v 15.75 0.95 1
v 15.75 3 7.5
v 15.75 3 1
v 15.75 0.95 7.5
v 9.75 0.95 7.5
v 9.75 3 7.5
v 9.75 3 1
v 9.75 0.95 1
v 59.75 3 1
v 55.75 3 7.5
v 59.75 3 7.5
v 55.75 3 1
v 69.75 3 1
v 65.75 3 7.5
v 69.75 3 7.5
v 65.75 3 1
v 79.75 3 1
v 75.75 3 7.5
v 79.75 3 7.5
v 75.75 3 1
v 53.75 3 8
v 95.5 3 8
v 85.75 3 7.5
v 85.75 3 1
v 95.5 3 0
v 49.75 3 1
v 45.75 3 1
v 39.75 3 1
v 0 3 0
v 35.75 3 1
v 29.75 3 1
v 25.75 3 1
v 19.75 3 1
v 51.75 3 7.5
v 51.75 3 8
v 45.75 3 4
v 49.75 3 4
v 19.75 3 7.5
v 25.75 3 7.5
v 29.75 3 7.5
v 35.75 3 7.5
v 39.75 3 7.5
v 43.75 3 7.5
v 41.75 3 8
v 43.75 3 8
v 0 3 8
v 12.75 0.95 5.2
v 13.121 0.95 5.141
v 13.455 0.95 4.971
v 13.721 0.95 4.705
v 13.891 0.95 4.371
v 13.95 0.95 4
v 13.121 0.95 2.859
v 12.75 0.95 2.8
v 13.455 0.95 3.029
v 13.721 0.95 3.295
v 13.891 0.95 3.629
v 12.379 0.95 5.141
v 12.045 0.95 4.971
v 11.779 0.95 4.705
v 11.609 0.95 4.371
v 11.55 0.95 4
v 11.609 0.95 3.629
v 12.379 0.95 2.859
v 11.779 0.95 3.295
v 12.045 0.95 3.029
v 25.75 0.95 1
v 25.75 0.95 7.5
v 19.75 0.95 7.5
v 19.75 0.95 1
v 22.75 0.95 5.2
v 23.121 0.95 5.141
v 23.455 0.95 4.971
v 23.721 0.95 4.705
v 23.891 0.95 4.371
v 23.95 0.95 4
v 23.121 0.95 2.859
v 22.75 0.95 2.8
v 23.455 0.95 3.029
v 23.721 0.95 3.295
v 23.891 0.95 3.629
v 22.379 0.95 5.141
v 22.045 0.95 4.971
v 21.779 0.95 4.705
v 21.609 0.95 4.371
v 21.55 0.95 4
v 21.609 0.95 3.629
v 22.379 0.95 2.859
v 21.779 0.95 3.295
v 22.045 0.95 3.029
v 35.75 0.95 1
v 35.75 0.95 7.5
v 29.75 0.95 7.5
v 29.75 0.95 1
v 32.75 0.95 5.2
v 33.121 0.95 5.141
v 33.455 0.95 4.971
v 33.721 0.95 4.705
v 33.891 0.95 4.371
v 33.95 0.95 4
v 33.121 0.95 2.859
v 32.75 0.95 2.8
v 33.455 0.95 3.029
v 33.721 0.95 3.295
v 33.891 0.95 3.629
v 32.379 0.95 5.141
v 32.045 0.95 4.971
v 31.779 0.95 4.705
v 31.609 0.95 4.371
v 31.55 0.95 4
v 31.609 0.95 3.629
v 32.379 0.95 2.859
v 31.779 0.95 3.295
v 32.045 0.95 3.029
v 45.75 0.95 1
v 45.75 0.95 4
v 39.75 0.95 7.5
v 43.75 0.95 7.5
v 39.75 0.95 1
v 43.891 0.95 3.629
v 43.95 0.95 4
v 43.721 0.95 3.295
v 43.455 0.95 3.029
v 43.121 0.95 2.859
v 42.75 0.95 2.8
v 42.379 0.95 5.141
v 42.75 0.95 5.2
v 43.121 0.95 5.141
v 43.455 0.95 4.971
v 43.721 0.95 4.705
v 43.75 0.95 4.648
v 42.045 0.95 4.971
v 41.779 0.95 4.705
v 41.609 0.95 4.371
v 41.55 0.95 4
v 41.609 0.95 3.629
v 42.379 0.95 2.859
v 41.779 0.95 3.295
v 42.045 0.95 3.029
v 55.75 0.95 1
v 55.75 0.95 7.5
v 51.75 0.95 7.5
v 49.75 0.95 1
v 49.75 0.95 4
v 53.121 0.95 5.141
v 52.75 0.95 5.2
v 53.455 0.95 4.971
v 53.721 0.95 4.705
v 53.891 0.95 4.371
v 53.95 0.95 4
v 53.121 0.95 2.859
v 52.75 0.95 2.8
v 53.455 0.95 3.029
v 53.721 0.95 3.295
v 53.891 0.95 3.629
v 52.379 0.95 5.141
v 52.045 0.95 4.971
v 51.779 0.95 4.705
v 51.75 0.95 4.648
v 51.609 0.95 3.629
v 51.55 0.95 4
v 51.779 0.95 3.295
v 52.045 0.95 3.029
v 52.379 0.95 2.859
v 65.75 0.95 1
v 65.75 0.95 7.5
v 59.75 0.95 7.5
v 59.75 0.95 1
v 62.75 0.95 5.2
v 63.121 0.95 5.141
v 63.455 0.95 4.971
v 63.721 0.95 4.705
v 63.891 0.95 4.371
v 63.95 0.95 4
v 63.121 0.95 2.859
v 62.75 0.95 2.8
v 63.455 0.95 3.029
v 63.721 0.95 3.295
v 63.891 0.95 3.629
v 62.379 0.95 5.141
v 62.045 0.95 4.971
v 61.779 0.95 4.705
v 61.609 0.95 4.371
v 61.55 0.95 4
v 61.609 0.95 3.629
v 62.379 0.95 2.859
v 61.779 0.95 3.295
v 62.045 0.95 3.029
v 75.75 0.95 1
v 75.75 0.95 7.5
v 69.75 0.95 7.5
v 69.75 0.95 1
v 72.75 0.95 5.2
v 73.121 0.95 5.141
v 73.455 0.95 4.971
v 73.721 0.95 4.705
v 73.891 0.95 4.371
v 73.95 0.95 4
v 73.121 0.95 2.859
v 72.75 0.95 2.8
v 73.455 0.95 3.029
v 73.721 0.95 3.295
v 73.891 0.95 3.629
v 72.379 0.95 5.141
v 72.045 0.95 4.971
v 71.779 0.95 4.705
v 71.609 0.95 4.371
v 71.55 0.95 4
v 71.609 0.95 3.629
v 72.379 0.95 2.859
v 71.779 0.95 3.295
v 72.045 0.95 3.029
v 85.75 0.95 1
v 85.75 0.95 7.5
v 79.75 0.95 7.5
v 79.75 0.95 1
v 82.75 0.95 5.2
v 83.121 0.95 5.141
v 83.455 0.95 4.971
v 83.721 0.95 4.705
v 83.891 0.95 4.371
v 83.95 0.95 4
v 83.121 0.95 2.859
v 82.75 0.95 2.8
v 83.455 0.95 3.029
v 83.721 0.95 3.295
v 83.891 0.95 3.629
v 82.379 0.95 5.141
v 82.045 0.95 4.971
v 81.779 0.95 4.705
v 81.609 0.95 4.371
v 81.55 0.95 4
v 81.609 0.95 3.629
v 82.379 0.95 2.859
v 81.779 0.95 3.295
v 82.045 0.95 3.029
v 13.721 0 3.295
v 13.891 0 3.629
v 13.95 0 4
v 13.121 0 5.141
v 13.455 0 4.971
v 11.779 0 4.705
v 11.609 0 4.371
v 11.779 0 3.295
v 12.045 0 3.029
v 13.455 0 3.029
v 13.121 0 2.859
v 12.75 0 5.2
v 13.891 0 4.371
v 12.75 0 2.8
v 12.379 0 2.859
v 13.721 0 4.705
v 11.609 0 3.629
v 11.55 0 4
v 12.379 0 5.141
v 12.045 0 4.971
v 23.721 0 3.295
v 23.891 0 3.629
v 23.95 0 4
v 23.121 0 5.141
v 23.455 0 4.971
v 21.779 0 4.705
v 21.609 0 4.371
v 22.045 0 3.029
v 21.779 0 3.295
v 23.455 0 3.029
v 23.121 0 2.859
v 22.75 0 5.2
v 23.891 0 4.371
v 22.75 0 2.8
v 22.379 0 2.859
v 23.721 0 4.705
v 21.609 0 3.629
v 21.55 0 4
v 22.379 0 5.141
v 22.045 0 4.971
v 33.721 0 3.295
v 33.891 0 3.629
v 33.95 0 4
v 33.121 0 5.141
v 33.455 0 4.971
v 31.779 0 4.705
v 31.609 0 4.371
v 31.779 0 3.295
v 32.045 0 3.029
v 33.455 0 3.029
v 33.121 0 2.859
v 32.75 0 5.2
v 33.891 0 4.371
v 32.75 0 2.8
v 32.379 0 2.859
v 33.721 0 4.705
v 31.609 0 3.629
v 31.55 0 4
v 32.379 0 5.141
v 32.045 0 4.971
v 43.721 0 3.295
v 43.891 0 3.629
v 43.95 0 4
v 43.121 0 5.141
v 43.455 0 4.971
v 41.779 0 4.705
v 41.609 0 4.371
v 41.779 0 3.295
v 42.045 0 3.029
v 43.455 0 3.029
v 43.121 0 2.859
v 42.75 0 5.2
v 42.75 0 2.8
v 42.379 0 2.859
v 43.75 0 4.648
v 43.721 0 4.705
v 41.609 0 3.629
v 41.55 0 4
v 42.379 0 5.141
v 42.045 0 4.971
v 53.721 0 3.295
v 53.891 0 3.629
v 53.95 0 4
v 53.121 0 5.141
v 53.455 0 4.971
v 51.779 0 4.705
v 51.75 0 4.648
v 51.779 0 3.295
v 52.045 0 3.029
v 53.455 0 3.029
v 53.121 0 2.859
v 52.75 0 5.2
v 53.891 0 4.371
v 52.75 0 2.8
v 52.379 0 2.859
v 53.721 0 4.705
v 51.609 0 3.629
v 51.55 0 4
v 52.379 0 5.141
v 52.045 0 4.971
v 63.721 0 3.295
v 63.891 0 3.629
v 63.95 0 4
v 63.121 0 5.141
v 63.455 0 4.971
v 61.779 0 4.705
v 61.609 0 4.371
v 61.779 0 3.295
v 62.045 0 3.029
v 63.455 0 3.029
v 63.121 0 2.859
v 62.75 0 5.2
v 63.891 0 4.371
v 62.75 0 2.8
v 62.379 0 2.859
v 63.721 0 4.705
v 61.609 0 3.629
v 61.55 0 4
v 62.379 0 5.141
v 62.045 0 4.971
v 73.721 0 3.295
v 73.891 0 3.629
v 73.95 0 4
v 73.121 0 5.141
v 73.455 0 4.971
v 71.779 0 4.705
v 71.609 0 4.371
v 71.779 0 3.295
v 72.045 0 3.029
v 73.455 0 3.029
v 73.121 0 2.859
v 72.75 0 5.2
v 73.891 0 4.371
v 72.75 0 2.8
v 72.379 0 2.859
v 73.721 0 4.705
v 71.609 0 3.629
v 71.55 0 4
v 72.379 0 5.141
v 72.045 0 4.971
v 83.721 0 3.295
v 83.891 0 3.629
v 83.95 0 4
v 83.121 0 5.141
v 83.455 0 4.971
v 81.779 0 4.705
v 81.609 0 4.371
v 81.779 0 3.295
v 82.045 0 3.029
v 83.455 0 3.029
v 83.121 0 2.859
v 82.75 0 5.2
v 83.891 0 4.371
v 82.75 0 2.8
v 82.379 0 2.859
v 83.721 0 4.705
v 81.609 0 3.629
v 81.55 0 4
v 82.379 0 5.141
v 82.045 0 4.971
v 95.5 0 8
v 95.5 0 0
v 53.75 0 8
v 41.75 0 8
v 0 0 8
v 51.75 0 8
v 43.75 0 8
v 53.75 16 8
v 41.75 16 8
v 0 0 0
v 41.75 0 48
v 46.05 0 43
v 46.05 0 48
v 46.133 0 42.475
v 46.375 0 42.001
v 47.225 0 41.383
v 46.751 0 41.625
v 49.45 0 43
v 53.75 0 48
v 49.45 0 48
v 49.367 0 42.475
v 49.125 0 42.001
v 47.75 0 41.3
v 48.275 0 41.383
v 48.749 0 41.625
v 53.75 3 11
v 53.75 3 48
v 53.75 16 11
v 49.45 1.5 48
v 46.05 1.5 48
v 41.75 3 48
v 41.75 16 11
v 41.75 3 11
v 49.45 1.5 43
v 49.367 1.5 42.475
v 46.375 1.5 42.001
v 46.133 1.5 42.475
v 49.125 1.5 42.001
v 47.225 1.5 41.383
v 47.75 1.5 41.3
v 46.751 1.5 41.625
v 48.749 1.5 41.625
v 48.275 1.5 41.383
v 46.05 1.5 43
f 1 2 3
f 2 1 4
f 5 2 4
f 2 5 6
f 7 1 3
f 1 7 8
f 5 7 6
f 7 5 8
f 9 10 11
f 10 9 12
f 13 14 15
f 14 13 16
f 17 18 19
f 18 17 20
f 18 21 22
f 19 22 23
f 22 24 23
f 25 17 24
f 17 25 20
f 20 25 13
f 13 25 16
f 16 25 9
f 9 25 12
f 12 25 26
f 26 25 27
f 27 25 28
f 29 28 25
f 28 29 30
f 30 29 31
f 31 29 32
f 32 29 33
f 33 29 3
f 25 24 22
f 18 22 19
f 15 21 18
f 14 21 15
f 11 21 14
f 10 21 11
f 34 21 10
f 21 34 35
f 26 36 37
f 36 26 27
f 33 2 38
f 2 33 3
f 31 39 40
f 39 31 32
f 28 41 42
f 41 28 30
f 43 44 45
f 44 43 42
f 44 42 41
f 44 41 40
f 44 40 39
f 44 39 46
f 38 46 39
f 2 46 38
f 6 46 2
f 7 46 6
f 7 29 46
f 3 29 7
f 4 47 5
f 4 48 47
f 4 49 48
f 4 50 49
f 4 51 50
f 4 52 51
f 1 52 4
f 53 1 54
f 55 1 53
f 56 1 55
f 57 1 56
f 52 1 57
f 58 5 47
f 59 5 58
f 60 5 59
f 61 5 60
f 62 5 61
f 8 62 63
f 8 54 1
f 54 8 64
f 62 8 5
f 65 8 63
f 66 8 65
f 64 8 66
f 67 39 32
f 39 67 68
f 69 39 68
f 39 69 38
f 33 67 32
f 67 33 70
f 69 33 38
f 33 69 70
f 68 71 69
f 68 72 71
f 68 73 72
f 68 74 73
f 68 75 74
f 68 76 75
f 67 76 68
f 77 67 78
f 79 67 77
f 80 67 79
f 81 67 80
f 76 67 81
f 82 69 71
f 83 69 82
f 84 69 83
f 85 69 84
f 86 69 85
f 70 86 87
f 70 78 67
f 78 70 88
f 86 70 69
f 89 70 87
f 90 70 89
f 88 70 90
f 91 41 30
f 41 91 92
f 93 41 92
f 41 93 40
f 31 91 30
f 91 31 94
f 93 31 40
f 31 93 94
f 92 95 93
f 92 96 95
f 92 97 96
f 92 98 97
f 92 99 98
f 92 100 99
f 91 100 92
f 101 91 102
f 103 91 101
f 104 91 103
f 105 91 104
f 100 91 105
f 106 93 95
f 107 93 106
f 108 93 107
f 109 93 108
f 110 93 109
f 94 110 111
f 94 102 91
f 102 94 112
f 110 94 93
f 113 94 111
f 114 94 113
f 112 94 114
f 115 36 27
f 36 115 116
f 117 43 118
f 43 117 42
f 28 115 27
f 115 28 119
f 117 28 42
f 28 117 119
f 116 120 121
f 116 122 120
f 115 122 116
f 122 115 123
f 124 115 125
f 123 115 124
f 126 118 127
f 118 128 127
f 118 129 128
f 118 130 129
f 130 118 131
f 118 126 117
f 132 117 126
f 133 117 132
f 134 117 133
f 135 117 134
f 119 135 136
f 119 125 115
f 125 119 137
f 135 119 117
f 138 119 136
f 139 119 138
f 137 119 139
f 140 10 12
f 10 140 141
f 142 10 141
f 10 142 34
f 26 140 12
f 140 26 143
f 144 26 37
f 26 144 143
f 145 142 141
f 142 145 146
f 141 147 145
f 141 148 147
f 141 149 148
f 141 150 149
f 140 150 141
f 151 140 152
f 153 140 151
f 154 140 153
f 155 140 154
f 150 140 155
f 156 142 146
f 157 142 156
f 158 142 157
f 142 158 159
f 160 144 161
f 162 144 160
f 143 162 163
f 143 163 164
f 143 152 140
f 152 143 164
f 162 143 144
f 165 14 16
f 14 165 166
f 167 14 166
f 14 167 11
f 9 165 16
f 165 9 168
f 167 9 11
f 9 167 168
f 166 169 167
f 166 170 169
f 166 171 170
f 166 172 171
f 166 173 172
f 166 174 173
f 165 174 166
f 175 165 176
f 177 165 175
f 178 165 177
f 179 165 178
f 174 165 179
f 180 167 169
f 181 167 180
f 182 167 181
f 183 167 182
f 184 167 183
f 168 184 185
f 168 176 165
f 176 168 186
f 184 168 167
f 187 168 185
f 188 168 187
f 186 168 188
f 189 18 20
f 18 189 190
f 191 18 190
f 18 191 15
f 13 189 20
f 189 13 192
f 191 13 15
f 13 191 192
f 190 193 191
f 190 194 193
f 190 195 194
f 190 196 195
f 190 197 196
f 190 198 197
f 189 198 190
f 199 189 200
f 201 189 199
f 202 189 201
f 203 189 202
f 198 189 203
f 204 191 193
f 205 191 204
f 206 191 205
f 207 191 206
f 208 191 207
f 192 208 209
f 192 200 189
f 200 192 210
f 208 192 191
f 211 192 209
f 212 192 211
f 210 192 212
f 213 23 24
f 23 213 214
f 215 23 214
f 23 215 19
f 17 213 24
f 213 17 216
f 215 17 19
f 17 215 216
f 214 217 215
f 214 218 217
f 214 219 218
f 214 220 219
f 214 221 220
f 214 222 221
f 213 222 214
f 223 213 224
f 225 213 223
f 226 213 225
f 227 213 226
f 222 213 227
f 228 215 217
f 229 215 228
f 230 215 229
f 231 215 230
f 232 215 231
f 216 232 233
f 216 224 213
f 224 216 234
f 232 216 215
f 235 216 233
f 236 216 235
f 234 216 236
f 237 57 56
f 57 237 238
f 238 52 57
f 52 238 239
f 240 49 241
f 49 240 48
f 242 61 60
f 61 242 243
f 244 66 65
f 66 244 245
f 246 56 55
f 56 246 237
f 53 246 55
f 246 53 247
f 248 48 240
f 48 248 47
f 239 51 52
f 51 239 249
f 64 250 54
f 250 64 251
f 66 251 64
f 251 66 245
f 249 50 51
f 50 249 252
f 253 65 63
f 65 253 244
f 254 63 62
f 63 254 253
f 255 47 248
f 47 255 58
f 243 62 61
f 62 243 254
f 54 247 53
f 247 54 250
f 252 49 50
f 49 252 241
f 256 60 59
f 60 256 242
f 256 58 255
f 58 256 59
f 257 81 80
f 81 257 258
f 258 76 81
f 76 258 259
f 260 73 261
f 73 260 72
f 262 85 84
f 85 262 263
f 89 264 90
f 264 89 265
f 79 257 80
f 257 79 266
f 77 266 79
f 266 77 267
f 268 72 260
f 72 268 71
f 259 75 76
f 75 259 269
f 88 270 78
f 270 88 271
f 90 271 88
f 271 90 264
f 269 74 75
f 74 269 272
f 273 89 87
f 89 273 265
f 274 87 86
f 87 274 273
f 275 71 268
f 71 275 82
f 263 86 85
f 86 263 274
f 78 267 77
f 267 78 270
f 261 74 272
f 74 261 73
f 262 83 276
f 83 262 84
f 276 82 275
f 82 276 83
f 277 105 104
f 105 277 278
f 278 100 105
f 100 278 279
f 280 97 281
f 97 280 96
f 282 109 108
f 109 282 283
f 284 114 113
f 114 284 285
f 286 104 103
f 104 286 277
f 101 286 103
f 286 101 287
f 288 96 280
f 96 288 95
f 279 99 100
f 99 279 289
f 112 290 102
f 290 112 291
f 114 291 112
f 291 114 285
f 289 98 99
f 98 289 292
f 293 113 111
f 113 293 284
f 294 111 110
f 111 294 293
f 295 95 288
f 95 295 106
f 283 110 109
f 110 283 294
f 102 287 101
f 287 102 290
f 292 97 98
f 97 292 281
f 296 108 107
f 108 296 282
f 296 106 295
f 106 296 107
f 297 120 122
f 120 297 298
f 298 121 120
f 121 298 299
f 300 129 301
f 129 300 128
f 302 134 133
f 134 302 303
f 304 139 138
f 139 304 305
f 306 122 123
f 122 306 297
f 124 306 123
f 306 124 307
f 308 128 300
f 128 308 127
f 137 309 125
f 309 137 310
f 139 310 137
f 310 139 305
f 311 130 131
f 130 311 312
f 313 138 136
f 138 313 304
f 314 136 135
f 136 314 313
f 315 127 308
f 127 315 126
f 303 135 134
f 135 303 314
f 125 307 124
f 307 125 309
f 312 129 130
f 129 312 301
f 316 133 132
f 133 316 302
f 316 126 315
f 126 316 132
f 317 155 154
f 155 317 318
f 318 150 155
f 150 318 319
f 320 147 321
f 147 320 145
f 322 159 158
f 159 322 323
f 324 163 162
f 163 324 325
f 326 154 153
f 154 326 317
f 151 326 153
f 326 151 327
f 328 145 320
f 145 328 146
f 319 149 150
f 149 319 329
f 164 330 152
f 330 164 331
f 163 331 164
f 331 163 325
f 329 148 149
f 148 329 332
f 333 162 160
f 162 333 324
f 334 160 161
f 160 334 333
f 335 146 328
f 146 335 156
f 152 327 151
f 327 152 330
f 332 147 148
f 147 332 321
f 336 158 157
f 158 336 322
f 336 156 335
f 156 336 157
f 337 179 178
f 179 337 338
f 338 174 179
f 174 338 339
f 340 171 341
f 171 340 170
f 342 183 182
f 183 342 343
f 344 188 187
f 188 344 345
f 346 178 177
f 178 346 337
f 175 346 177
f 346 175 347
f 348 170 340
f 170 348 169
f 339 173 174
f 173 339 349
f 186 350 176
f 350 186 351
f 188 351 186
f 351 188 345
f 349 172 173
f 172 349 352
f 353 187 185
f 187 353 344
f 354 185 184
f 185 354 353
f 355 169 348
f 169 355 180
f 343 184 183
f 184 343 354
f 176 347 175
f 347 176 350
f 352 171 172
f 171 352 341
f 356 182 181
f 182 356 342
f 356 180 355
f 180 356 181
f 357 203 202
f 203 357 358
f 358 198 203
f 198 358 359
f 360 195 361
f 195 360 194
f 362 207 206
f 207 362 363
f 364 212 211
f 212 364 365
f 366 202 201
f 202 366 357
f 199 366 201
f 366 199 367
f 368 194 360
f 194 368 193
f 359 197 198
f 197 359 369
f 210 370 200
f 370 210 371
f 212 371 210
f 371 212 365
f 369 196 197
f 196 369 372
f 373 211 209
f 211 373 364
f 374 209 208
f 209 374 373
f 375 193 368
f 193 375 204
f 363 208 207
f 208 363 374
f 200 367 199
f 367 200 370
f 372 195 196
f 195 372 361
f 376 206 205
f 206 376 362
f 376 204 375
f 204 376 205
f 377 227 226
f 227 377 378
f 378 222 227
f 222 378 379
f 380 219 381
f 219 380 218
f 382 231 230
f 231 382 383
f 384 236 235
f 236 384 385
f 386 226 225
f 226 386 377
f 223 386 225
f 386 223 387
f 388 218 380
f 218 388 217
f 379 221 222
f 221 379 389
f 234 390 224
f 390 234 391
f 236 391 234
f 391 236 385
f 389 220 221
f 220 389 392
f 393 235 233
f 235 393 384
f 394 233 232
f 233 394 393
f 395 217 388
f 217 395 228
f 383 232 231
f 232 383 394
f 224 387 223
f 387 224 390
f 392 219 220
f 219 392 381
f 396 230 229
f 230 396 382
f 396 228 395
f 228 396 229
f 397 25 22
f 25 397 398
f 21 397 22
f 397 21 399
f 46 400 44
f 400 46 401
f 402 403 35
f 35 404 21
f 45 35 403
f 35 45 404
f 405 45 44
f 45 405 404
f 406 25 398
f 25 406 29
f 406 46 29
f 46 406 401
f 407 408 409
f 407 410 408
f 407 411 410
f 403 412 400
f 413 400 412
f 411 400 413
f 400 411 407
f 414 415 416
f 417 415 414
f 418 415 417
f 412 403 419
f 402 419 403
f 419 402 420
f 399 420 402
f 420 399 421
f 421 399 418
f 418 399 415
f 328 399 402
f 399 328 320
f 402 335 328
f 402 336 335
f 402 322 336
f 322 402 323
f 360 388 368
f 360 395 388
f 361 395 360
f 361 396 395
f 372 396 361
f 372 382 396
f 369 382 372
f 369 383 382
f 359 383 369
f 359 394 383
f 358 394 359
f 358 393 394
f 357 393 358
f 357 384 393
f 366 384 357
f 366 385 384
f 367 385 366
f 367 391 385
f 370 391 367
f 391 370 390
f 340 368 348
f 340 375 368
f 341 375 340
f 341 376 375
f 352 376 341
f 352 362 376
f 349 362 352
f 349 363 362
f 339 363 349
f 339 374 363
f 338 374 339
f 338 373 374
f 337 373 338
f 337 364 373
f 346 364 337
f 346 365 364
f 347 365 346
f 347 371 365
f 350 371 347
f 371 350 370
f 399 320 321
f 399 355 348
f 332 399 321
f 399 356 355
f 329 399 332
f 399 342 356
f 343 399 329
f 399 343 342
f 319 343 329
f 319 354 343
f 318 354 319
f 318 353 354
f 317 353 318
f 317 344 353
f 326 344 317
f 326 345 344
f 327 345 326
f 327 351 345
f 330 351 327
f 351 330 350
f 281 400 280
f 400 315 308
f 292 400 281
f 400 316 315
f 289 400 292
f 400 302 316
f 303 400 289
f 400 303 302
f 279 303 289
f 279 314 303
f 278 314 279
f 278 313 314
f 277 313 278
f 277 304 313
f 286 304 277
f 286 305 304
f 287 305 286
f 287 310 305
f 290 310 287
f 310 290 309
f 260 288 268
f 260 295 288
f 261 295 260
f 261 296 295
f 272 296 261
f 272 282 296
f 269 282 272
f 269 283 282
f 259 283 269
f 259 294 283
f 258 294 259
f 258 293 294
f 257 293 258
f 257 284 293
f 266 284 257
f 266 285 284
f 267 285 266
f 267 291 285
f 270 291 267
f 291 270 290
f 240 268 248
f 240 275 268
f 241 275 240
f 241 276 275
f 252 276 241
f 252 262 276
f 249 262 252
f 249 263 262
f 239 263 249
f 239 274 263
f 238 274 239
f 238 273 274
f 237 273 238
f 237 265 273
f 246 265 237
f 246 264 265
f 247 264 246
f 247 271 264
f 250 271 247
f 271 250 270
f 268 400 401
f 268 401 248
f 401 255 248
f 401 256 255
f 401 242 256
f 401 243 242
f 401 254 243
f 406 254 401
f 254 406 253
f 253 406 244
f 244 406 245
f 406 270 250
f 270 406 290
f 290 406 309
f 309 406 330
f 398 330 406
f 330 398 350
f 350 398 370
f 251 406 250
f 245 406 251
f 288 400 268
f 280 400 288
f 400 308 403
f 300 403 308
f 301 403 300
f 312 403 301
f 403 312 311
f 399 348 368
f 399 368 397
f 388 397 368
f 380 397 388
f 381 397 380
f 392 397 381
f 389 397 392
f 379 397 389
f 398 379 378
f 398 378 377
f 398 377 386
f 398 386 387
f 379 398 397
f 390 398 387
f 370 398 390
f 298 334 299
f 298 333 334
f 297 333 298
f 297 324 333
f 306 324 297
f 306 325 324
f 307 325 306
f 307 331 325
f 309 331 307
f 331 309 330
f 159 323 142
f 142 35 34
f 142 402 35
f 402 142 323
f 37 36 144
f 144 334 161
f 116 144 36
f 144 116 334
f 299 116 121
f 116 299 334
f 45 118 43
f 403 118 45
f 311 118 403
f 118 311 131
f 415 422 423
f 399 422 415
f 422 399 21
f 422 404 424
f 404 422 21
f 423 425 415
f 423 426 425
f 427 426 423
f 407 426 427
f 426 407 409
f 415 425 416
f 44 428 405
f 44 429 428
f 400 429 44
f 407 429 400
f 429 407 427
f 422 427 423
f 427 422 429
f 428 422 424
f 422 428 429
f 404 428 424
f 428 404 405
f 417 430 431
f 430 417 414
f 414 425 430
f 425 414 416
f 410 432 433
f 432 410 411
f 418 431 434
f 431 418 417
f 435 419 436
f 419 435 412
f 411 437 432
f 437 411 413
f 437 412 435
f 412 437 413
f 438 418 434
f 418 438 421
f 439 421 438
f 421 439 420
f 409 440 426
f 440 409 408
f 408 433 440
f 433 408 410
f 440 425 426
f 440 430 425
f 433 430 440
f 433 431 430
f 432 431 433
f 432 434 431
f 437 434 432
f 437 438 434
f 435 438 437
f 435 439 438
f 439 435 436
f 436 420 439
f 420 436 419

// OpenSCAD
// sensor_bar.scad — Barra de sensores LFR (8× TCRT5000 / QRE1113)
// Fatiamento: PETG, 0.15mm camada, 50% infill, 4 perímetros
// Montagem: parafusos M2 × 6mm nos sensores, M3 no suporte vertical
// Rafael Costa — LFR ESP32

// ═══ PARÂMETROS ══════════════════════════════════════════════════════════════
SENSOR_COUNT    = 8;
SENSOR_SPACING  = 10;     // mm — centro a centro
SENSOR_W        = 5.5;    // mm — largura do corpo TCRT5000
SENSOR_H        = 5.5;    // mm — altura do corpo
SENSOR_T        = 1.8;    // mm — profundidade (plana no PCB)
SENSOR_DEPTH    = 4;      // mm — altura do solo ao sensor (spec)

BAR_THICK       = 3;      // mm — espessura da barra
BAR_HEIGHT      = 8;      // mm — altura total da barra
BAR_EXTRA       = 10;     // mm — extensão além dos sensores externos

MOUNT_H         = 40;     // mm — altura do suporte vertical até o chassi
MOUNT_W         = 12;     // mm — largura do suporte
MOUNT_SLOT_W    = 4;      // mm — slot de ajuste de altura (±5mm)

CABLE_CHANNEL_W = 8;      // mm — canal para flat cable/fios
CABLE_CHANNEL_H = 3;

TOL = 0.25;

// ═══ MÓDULOS ═════════════════════════════════════════════════════════════════

module sensorPocket() {
    // Encaixe para TCRT5000 — desliza pelo topo
    cube([SENSOR_W + TOL*2,
          SENSOR_T + TOL,
          SENSOR_H + 1]);
}

module m2Hole() {
    cylinder(d=2.4, h=20, $fn=20);
}

module m3Hole() {
    cylinder(d=3.4, h=30, $fn=20);
}

module slotHole(w, h, l) {
    // Slot oblongo para ajuste
    hull() {
        cylinder(d=w, h=l, $fn=20);
        translate([0, h, 0]) cylinder(d=w, h=l, $fn=20);
    }
}

// ═══ BARRA PRINCIPAL ════════════════════════════════════════════════════════

module sensorBar() {
    BAR_TOTAL = (SENSOR_COUNT - 1) * SENSOR_SPACING + SENSOR_W + BAR_EXTRA * 2;
    START_X   = BAR_EXTRA;

    difference() {
        // Corpo da barra
        translate([0, 0, 0])
            cube([BAR_TOTAL, BAR_THICK, BAR_HEIGHT]);

        // Pockets dos sensores (abertos pelo fundo para apontar ao solo)
        for (i = [0 : SENSOR_COUNT - 1]) {
            translate([START_X + i * SENSOR_SPACING - TOL,
                       BAR_THICK - SENSOR_T - TOL,
                       1])
                sensorPocket();
        }

        // Furos M2 de fixação dos sensores
        for (i = [0 : SENSOR_COUNT - 1]) {
            translate([START_X + i * SENSOR_SPACING + SENSOR_W/2,
                       -1,
                       BAR_HEIGHT / 2])
                rotate([-90, 0, 0])
                    m2Hole();
        }

        // Canal de cabos (topo da barra, centralizado)
        translate([(BAR_TOTAL - CABLE_CHANNEL_W) / 2,
                   -1,
                   BAR_HEIGHT - CABLE_CHANNEL_H - 1])
            cube([CABLE_CHANNEL_W, BAR_THICK + 2, CABLE_CHANNEL_H + 1]);
    }
}

// ═══ SUPORTE VERTICAL ═══════════════════════════════════════════════════════

module mountArm() {
    BAR_TOTAL = (SENSOR_COUNT - 1) * SENSOR_SPACING + SENSOR_W + BAR_EXTRA * 2;
    ARM_X     = BAR_TOTAL / 2 - MOUNT_W / 2;

    difference() {
        union() {
            // Haste vertical
            translate([ARM_X, 0, BAR_HEIGHT])
                cube([MOUNT_W, BAR_THICK, MOUNT_H]);

            // Reforço triangular (evita flex)
            translate([ARM_X, 0, BAR_HEIGHT])
                rotate([0, 0, 0])
                linear_extrude(height=BAR_THICK)
                    polygon([[0,0],
                             [MOUNT_W, 0],
                             [MOUNT_W, MOUNT_H * 0.4],
                             [0, MOUNT_H * 0.4]]);
        }

        // Slot de ajuste de altura (M3) no topo do suporte
        translate([ARM_X + MOUNT_W/2,
                   BAR_THICK/2,
                   BAR_HEIGHT + MOUNT_H - 5])
            rotate([90, 0, 0])
                slotHole(3.4, 10, BAR_THICK + 2);
    }
}

// ═══ RENDER ══════════════════════════════════════════════════════════════════
// Para exportar STL: openscad -o sensor_bar.stl sensor_bar.scad
sensorBar();
mountArm();
